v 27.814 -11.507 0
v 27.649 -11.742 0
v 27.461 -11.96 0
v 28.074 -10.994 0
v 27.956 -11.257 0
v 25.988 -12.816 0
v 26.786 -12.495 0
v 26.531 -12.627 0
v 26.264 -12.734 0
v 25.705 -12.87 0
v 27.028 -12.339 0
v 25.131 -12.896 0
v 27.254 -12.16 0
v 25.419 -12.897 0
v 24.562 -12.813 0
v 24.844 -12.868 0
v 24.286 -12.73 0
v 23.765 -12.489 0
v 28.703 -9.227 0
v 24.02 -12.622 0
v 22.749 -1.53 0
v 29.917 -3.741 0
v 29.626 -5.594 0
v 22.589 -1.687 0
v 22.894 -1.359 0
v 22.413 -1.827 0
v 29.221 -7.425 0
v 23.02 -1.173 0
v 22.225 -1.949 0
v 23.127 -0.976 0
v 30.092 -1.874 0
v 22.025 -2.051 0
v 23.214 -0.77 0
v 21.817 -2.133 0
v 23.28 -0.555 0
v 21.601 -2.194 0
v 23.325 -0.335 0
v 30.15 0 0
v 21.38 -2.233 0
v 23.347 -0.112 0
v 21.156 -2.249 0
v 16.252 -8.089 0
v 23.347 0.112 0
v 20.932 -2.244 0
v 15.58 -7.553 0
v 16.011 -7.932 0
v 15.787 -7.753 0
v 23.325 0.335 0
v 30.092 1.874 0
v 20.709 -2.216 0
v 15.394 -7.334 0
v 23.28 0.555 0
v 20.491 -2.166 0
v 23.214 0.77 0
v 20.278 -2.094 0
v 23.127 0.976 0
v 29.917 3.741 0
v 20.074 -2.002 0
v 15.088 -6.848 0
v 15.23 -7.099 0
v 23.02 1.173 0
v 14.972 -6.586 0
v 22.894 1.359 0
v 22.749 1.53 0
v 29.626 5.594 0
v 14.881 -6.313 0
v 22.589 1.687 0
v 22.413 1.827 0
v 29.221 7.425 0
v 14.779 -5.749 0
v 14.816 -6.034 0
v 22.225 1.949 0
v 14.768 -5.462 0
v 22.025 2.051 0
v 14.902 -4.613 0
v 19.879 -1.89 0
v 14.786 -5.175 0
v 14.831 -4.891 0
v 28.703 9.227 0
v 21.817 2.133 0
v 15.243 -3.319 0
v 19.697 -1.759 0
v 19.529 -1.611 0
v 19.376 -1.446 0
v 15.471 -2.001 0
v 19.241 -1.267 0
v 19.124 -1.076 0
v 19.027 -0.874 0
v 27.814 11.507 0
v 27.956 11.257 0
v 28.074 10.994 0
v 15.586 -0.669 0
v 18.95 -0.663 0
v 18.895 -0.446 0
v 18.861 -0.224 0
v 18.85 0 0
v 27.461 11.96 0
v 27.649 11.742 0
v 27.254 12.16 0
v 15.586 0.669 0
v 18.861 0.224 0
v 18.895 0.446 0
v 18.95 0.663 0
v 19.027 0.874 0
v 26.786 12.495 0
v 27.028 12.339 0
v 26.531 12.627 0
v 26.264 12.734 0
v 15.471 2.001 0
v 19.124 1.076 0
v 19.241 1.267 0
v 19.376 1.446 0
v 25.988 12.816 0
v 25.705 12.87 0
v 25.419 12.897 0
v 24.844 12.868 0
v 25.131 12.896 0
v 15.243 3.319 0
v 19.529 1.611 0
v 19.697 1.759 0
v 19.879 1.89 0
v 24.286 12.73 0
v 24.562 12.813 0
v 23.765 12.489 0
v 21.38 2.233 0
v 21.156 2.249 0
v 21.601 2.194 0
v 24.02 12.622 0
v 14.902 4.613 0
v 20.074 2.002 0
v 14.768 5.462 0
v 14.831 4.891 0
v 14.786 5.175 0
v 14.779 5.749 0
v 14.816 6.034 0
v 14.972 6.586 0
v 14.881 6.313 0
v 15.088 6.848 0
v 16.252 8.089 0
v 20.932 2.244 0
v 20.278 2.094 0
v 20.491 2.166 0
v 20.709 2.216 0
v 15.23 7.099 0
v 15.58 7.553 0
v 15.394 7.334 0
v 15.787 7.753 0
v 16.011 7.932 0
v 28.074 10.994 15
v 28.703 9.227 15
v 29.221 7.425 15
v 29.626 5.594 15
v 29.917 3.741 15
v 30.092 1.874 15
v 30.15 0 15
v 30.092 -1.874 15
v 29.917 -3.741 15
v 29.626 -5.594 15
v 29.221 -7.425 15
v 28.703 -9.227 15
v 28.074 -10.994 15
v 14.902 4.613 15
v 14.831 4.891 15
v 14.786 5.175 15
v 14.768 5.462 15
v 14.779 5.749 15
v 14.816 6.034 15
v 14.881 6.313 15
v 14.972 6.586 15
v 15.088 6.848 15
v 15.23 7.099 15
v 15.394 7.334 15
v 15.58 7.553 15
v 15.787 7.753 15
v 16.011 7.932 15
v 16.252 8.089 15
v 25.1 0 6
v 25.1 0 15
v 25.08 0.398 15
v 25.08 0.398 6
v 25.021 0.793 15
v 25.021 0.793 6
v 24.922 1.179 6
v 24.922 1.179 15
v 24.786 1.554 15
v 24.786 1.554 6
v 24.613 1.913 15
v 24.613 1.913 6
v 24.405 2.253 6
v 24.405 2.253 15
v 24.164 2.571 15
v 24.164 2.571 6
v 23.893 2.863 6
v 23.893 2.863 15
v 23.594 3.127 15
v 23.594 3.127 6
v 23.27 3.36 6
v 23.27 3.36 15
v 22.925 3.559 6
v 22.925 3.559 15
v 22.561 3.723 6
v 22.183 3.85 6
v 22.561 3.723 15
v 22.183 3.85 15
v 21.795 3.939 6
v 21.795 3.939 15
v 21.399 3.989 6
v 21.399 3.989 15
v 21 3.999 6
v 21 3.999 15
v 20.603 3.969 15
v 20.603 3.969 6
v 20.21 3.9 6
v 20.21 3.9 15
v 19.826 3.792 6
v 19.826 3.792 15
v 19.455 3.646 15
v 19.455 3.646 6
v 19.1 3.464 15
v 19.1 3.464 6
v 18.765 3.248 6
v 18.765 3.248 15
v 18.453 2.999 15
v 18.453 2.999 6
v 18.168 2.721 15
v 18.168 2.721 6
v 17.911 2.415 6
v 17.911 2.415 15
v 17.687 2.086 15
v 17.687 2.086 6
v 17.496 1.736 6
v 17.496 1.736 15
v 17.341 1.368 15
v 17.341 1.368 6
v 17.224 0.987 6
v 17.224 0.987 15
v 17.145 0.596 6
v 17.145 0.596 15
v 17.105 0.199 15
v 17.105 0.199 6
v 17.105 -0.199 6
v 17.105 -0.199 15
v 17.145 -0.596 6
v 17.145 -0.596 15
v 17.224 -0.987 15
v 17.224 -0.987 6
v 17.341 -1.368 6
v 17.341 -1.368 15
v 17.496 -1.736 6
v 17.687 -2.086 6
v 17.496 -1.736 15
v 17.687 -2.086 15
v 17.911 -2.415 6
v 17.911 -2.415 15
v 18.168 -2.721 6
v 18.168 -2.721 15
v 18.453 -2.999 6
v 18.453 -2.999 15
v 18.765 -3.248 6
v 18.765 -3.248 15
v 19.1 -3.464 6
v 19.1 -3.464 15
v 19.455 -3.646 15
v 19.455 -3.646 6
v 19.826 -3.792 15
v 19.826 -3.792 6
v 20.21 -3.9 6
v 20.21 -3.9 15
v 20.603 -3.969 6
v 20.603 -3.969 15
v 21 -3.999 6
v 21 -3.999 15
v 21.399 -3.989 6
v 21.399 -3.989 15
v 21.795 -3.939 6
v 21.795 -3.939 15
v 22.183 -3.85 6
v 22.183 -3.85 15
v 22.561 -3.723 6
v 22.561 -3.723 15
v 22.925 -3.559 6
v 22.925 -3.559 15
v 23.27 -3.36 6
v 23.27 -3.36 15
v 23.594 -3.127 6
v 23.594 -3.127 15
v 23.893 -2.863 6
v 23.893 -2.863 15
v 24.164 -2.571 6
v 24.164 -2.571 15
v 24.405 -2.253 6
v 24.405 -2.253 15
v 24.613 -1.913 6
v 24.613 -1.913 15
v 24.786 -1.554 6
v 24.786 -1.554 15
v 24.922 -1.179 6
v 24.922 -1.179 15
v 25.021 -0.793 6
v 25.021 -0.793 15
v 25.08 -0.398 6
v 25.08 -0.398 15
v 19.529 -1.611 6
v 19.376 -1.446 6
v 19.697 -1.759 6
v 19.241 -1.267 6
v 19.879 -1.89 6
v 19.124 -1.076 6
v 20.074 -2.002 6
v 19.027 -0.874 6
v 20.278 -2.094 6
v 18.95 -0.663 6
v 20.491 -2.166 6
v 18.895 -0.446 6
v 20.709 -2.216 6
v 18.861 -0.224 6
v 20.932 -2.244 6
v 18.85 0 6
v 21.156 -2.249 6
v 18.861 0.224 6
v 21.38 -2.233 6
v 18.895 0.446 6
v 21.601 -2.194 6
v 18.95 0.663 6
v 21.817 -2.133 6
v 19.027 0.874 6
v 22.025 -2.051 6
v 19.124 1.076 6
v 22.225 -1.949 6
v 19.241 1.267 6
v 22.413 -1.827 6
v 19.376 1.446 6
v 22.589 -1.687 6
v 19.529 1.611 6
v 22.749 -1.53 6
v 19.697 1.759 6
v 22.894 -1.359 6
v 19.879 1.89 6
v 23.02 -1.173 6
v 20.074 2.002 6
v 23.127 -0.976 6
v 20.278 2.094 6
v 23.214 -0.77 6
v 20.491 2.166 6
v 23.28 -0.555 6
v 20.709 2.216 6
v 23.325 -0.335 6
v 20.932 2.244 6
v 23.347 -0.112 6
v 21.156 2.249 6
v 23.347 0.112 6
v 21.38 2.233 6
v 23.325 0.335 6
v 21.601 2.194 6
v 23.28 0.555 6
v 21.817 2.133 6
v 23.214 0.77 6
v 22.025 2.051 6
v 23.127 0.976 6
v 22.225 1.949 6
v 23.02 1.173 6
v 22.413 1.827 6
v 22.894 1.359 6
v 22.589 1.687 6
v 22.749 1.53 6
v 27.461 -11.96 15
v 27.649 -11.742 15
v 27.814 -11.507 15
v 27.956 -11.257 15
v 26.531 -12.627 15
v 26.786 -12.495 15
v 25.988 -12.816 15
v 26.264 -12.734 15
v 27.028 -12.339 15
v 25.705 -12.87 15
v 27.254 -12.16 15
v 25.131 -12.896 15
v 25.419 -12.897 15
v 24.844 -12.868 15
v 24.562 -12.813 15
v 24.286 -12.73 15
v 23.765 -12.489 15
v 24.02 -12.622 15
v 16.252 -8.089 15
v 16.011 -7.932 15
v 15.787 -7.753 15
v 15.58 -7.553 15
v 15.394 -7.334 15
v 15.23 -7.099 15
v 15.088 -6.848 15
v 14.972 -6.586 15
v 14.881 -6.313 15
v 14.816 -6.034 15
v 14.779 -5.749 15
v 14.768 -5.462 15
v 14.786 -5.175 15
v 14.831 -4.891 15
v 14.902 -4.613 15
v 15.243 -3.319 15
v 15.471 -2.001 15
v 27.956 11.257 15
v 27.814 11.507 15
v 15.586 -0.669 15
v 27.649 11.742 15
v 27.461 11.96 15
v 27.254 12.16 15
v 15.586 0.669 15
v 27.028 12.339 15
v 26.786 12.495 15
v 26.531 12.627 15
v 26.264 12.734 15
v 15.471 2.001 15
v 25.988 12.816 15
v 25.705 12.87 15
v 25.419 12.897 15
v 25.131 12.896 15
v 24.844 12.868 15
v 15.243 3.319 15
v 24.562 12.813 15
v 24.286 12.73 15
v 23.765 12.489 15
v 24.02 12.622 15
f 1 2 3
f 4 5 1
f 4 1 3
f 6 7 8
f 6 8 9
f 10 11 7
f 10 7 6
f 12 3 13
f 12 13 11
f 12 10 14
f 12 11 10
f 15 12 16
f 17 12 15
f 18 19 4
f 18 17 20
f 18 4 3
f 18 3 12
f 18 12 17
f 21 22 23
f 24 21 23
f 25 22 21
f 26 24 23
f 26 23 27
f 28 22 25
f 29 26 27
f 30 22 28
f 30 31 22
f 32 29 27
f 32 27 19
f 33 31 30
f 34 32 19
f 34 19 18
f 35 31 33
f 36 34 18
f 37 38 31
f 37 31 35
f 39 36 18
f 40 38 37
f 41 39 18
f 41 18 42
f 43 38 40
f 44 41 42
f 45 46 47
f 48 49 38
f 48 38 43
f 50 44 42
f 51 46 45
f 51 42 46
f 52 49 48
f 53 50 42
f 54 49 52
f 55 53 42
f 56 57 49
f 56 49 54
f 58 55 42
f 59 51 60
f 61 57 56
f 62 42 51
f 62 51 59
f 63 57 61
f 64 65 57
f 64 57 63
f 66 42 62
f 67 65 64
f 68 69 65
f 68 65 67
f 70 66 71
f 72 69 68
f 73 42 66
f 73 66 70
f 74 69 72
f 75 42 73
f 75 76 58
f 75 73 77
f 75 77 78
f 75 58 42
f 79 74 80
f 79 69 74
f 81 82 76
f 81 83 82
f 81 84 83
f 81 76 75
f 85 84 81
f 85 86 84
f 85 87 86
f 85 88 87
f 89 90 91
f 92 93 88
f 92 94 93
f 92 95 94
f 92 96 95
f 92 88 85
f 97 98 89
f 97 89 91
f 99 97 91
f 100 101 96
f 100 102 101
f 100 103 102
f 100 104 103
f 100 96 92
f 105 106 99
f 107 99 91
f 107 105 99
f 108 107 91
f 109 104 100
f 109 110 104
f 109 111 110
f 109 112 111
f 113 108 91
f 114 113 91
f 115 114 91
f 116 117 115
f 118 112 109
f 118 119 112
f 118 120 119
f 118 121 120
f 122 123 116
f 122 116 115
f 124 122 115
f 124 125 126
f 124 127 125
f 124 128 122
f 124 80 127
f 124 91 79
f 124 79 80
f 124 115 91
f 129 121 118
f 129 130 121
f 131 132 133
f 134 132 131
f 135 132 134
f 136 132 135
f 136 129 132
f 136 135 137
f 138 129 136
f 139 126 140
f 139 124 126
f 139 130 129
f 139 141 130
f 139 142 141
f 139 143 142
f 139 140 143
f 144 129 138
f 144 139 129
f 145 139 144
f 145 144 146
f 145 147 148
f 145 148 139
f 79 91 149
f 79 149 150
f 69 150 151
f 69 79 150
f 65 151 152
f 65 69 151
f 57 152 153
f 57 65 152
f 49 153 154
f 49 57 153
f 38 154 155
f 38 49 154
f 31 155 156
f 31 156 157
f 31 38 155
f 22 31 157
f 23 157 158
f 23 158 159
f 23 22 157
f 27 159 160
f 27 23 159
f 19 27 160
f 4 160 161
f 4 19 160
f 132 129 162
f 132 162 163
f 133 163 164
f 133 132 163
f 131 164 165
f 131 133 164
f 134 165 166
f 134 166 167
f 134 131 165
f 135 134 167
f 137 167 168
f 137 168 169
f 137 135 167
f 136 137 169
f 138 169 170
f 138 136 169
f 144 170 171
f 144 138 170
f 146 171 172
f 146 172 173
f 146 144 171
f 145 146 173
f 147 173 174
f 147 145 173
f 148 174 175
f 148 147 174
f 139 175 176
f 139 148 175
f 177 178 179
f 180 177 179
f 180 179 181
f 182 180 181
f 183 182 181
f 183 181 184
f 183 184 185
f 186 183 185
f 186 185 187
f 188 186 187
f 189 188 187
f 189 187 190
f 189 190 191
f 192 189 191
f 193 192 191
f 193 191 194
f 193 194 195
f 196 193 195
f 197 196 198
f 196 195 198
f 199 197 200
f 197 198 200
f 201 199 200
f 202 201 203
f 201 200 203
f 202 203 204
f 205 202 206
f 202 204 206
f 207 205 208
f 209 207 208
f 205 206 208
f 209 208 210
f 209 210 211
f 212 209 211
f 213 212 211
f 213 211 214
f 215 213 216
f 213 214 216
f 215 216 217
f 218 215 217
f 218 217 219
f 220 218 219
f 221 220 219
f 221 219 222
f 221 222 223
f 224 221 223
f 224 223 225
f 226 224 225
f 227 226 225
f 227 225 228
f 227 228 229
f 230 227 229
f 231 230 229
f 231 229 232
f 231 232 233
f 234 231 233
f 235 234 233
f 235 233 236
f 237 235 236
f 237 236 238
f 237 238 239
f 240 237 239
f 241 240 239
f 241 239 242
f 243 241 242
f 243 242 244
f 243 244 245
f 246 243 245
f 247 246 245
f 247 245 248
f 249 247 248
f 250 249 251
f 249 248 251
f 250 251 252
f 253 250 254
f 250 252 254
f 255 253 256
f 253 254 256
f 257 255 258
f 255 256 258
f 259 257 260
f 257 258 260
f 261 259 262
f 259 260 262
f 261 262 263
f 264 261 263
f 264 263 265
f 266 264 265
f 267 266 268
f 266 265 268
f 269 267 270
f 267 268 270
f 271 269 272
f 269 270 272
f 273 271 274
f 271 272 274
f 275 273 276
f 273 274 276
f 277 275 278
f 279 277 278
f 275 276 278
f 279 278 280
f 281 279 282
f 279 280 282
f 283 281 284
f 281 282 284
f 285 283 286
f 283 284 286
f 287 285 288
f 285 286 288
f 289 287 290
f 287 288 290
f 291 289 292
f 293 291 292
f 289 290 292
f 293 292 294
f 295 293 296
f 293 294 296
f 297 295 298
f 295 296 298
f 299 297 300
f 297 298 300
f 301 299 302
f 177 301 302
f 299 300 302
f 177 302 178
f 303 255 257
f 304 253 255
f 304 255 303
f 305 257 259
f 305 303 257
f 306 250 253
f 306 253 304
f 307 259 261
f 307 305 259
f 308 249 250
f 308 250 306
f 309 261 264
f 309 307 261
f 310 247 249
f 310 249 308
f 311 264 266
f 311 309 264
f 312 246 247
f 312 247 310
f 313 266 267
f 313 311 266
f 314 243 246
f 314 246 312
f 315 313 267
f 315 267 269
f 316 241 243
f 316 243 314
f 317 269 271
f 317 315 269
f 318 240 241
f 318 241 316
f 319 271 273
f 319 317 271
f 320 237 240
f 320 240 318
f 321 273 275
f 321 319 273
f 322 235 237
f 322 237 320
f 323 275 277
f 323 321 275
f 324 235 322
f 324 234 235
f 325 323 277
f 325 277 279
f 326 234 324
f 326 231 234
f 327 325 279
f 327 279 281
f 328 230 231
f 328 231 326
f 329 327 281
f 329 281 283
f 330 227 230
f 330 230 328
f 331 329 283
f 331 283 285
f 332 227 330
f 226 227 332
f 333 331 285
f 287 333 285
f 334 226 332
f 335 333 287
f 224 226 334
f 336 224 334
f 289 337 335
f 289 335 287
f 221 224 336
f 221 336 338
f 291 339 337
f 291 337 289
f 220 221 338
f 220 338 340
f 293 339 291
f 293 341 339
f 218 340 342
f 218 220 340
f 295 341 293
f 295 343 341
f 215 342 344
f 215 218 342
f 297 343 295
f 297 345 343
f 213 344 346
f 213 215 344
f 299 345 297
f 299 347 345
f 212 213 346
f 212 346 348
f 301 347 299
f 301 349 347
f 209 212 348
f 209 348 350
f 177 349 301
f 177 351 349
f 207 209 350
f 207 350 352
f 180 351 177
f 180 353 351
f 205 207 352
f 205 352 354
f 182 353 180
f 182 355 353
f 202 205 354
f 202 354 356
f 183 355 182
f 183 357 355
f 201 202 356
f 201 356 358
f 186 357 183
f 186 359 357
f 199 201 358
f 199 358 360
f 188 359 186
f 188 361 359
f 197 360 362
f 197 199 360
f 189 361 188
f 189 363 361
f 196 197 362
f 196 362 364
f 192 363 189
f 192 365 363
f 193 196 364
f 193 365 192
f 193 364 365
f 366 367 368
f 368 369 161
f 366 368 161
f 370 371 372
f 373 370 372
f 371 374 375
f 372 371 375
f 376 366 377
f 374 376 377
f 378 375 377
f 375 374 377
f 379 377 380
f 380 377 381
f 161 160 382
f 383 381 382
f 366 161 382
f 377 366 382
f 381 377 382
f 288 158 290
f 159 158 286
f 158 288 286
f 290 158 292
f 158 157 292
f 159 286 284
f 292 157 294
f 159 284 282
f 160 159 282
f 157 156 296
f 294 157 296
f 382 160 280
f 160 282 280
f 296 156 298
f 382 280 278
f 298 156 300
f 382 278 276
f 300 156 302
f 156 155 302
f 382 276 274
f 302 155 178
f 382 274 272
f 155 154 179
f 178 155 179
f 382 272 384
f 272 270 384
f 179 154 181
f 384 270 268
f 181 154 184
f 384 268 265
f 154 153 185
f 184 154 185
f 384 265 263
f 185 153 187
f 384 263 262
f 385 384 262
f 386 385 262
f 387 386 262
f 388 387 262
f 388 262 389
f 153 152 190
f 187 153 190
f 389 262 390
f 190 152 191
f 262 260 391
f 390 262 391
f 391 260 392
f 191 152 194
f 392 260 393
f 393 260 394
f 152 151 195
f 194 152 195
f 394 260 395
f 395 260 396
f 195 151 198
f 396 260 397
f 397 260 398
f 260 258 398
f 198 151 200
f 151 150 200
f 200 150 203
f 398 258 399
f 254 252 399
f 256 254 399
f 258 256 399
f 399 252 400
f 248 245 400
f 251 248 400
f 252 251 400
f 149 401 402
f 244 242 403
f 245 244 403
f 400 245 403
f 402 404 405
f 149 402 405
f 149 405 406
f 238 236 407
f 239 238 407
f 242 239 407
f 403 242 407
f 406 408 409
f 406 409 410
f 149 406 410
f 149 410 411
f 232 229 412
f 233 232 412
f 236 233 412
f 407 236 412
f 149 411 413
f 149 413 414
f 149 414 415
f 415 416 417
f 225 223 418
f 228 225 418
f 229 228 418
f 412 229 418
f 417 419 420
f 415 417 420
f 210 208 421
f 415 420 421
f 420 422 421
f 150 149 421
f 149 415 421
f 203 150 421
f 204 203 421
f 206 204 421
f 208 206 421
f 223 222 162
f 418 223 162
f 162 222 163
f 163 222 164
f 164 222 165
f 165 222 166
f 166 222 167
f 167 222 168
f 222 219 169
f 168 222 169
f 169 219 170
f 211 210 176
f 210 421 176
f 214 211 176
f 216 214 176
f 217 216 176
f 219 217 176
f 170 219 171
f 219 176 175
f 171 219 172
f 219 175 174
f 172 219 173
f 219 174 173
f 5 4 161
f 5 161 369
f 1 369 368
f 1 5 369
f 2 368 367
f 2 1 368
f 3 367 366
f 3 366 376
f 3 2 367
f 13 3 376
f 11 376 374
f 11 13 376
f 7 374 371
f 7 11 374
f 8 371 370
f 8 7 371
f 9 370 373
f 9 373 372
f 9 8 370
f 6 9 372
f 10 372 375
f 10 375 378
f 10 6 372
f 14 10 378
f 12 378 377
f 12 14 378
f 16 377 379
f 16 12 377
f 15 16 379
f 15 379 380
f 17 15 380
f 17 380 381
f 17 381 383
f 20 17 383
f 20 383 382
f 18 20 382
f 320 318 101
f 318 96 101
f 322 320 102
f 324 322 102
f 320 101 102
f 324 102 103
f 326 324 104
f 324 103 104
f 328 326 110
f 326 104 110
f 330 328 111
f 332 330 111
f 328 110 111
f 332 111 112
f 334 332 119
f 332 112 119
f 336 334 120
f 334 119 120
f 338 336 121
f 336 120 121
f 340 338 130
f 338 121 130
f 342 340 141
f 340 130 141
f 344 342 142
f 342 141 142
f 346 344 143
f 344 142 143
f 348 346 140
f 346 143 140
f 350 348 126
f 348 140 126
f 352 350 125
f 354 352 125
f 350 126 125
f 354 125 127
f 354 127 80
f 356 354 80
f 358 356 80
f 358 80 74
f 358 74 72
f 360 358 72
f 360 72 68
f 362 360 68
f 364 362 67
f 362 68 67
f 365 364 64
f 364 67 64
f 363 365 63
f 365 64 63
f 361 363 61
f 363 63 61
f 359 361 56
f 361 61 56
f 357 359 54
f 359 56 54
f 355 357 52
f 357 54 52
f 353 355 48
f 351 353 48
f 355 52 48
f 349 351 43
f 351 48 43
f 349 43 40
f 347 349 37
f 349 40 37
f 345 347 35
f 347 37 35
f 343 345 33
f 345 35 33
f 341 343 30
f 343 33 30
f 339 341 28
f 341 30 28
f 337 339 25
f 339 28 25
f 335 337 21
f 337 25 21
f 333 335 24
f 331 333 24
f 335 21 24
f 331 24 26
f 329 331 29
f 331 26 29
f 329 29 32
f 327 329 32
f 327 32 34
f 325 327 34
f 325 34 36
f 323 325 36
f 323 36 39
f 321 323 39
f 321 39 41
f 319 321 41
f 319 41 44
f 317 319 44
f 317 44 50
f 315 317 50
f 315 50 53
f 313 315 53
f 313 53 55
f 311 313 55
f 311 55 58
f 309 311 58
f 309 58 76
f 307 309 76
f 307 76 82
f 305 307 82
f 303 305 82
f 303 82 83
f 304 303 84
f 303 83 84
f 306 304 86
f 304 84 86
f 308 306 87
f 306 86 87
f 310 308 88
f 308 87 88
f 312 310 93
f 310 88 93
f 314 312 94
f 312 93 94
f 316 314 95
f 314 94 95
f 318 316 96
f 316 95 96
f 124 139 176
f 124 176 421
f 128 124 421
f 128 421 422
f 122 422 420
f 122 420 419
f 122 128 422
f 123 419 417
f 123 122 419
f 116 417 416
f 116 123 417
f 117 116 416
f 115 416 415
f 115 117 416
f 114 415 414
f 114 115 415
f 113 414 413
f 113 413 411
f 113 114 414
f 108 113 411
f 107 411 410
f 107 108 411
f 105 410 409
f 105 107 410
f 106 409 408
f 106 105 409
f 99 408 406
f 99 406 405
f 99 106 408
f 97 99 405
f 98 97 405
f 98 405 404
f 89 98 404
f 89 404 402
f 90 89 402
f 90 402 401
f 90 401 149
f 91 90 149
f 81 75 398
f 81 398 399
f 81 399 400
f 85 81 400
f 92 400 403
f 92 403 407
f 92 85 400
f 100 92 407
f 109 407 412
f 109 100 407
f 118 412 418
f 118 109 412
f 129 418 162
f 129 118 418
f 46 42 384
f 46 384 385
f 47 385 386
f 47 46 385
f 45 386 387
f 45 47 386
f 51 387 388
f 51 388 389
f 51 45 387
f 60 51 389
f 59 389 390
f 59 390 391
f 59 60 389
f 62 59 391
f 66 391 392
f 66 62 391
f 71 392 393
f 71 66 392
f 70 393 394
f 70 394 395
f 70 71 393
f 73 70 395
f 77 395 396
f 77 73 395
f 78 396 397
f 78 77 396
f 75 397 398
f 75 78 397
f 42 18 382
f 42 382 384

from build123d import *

# Parameters (mm, degrees)
CORPO_DEPTH                     = 15
REBAIXO_PARAFUSO_M4_D           = 4.5
REBAIXO_PARAFUSO_M4_DEPTH       = 30
REBAIXO_PARAFUSO_M4_CBORE_D     = 8
REBAIXO_PARAFUSO_M4_CBORE_DEPTH = 9
REBAIXO_PARAFUSO_M4_TIP         = 1.351936393


with BuildPart() as part:
    # Sketch1 → Corpo (new body)
    with BuildSketch(Plane.XY):
        with BuildLine():
            Line((16.252058195, 8.088672021), (23.764502557, 12.488672021))
            ThreePointArc((23.764502557, 12.488672021), (26.263743802, 12.734356122), (28.074119126, 10.993922652))
            ThreePointArc((28.074119126, 10.993922652), (30.15, 0), (28.074119126, -10.993922652))
            ThreePointArc((28.074119126, -10.993922652), (26.263743802, -12.734356122), (23.764502557, -12.488672021))
            Line((23.764502557, -12.488672021), (16.252058195, -8.088672021))
            ThreePointArc((16.252058195, -8.088672021), (14.971668435, -6.585929552), (14.902386515, -4.612903226))
            ThreePointArc((14.902386515, -4.612903226), (15.6, 0), (14.902386515, 4.612903226))
            ThreePointArc((14.902386515, 4.612903226), (14.971668435, 6.585929552), (16.252058195, 8.088672021))
        make_face()
    extrude(amount=CORPO_DEPTH)

    # Rebaixo - Parafuso M4
    with Locations(Plane.XY.offset(15)):
        with Locations((21.1, 0)):
            CounterBoreHole(REBAIXO_PARAFUSO_M4_D / 2, REBAIXO_PARAFUSO_M4_CBORE_D / 2, REBAIXO_PARAFUSO_M4_CBORE_DEPTH, depth=REBAIXO_PARAFUSO_M4_DEPTH)
            with Locations((0, 0, -(REBAIXO_PARAFUSO_M4_DEPTH + REBAIXO_PARAFUSO_M4_TIP / 2))):  # 118° drill point
                Cone(0, REBAIXO_PARAFUSO_M4_D / 2, REBAIXO_PARAFUSO_M4_TIP, mode=Mode.SUBTRACT)


solid = part.part
